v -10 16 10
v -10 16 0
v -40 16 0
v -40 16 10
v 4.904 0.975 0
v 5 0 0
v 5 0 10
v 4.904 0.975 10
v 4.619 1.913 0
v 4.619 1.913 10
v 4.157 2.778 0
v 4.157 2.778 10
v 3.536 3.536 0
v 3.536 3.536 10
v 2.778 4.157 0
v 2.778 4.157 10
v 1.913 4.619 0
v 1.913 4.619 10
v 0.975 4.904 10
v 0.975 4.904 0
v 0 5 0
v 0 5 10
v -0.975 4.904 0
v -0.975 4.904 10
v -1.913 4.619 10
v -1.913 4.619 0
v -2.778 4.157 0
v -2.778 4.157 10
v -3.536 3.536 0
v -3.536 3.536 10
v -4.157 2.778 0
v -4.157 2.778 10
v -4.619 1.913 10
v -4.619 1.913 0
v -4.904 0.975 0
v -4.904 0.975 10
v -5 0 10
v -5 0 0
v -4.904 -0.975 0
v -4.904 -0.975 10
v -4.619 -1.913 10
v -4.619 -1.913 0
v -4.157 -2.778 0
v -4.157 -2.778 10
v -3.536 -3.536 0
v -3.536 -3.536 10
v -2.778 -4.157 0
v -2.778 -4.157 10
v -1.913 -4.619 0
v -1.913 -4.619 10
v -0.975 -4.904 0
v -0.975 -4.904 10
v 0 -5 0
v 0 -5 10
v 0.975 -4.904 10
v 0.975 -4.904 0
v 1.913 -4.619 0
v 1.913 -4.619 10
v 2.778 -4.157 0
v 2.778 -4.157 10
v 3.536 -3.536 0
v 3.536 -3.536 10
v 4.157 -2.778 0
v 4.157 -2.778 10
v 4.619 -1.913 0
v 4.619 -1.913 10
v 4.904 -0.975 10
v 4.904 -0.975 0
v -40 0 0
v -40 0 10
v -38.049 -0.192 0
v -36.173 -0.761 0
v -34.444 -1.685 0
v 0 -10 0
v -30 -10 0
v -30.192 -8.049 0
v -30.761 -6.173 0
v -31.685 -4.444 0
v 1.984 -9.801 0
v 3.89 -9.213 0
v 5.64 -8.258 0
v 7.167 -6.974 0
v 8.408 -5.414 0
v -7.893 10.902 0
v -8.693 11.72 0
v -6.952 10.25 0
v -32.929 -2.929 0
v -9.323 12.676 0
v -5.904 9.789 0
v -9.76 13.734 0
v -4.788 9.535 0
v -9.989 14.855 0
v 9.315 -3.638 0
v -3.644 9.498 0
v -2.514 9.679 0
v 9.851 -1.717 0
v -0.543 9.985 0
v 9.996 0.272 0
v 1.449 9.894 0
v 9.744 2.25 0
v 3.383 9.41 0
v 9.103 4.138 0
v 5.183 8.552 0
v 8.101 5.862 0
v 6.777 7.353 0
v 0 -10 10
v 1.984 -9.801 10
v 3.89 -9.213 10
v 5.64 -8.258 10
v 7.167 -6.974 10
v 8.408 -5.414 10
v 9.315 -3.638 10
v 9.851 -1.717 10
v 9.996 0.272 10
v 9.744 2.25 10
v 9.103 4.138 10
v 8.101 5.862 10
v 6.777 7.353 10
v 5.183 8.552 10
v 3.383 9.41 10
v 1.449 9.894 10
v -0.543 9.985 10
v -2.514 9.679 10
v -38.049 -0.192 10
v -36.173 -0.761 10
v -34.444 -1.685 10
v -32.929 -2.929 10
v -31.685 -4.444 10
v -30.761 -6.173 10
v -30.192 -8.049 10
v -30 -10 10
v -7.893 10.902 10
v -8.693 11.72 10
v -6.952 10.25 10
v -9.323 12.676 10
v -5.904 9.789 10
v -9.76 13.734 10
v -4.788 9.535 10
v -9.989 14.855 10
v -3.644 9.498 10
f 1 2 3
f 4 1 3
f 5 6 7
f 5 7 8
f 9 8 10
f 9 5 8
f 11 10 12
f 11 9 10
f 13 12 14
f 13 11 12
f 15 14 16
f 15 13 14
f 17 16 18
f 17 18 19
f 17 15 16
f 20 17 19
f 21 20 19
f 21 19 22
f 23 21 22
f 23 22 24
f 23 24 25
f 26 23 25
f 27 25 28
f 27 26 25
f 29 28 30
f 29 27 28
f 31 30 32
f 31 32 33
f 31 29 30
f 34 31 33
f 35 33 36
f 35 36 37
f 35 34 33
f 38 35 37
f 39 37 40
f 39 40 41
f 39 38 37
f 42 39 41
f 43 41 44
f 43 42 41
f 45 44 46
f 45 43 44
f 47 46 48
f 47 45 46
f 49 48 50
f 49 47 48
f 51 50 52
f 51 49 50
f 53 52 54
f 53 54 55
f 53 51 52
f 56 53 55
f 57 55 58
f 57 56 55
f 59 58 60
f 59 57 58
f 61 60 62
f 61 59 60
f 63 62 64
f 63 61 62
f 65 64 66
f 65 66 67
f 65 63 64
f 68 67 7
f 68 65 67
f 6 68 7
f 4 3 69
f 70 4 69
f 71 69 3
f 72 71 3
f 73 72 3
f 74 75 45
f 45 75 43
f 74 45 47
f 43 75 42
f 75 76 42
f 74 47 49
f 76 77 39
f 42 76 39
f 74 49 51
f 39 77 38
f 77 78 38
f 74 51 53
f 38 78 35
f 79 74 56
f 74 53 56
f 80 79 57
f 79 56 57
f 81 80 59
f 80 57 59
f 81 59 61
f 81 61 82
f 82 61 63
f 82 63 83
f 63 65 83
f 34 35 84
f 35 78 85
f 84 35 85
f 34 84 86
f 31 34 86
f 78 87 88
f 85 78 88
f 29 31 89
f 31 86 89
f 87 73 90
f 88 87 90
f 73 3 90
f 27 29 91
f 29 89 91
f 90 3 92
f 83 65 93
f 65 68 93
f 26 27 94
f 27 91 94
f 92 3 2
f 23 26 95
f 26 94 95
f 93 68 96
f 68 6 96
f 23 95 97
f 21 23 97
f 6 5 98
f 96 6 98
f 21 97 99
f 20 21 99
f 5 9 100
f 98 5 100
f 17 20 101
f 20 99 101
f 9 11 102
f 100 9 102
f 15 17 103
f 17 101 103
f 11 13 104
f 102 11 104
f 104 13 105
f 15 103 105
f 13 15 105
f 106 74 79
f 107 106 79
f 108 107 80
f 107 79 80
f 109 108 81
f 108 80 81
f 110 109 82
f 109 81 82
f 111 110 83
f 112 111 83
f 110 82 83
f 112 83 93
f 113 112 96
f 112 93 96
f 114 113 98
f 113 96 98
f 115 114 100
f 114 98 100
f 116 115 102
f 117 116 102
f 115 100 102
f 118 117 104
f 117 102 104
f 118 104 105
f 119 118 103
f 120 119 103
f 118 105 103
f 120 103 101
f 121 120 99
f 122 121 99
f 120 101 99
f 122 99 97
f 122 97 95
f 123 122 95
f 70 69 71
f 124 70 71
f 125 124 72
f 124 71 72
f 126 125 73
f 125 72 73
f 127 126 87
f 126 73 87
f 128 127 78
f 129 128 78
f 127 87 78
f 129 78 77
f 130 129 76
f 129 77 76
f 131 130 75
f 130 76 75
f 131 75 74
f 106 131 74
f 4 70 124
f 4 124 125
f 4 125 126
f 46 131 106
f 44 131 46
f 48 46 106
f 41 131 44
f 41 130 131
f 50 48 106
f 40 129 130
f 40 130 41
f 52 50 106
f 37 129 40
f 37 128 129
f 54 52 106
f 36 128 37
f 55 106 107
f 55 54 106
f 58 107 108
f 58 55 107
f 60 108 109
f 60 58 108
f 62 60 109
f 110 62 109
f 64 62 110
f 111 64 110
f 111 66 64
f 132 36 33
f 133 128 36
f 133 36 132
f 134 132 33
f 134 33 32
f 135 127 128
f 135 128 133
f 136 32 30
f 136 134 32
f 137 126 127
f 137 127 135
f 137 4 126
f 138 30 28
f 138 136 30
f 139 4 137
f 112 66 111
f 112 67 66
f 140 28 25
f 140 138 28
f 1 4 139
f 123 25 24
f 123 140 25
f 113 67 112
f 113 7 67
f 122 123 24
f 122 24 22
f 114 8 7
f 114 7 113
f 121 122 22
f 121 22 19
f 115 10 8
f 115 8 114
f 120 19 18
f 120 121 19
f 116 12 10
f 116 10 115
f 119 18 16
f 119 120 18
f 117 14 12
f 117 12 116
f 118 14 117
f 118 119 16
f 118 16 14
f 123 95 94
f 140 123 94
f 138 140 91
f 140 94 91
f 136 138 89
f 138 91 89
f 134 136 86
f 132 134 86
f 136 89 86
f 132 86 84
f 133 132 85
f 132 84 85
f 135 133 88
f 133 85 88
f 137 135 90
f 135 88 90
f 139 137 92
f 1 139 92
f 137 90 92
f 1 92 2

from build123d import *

# Parameters (mm, degrees)
F0_R     = 5
F1_DEPTH = 10


with BuildPart() as f1:
    # F0 (on Top) → F1 (new body)
    with BuildSketch(Plane.XY):
        with BuildLine():
            Line((-30, -10), (-10, -10))
            Line((-10, -10), (0, -10))
            ThreePointArc((0, -10), (9.919398, 1.2671), (-2.513773, 9.678892))
            ThreePointArc((-2.513773, 9.678892), (-7.89291, 10.901868), (-10, 16))
            Line((-10, 16), (-40, 16))
            Line((-40, 16), (-40, 0))
            ThreePointArc((-40, 0), (-32.928932, -2.928932), (-30, -10))
        make_face()
        Circle(F0_R, mode=Mode.SUBTRACT)
    extrude(amount=F1_DEPTH)


solid = f1.part
